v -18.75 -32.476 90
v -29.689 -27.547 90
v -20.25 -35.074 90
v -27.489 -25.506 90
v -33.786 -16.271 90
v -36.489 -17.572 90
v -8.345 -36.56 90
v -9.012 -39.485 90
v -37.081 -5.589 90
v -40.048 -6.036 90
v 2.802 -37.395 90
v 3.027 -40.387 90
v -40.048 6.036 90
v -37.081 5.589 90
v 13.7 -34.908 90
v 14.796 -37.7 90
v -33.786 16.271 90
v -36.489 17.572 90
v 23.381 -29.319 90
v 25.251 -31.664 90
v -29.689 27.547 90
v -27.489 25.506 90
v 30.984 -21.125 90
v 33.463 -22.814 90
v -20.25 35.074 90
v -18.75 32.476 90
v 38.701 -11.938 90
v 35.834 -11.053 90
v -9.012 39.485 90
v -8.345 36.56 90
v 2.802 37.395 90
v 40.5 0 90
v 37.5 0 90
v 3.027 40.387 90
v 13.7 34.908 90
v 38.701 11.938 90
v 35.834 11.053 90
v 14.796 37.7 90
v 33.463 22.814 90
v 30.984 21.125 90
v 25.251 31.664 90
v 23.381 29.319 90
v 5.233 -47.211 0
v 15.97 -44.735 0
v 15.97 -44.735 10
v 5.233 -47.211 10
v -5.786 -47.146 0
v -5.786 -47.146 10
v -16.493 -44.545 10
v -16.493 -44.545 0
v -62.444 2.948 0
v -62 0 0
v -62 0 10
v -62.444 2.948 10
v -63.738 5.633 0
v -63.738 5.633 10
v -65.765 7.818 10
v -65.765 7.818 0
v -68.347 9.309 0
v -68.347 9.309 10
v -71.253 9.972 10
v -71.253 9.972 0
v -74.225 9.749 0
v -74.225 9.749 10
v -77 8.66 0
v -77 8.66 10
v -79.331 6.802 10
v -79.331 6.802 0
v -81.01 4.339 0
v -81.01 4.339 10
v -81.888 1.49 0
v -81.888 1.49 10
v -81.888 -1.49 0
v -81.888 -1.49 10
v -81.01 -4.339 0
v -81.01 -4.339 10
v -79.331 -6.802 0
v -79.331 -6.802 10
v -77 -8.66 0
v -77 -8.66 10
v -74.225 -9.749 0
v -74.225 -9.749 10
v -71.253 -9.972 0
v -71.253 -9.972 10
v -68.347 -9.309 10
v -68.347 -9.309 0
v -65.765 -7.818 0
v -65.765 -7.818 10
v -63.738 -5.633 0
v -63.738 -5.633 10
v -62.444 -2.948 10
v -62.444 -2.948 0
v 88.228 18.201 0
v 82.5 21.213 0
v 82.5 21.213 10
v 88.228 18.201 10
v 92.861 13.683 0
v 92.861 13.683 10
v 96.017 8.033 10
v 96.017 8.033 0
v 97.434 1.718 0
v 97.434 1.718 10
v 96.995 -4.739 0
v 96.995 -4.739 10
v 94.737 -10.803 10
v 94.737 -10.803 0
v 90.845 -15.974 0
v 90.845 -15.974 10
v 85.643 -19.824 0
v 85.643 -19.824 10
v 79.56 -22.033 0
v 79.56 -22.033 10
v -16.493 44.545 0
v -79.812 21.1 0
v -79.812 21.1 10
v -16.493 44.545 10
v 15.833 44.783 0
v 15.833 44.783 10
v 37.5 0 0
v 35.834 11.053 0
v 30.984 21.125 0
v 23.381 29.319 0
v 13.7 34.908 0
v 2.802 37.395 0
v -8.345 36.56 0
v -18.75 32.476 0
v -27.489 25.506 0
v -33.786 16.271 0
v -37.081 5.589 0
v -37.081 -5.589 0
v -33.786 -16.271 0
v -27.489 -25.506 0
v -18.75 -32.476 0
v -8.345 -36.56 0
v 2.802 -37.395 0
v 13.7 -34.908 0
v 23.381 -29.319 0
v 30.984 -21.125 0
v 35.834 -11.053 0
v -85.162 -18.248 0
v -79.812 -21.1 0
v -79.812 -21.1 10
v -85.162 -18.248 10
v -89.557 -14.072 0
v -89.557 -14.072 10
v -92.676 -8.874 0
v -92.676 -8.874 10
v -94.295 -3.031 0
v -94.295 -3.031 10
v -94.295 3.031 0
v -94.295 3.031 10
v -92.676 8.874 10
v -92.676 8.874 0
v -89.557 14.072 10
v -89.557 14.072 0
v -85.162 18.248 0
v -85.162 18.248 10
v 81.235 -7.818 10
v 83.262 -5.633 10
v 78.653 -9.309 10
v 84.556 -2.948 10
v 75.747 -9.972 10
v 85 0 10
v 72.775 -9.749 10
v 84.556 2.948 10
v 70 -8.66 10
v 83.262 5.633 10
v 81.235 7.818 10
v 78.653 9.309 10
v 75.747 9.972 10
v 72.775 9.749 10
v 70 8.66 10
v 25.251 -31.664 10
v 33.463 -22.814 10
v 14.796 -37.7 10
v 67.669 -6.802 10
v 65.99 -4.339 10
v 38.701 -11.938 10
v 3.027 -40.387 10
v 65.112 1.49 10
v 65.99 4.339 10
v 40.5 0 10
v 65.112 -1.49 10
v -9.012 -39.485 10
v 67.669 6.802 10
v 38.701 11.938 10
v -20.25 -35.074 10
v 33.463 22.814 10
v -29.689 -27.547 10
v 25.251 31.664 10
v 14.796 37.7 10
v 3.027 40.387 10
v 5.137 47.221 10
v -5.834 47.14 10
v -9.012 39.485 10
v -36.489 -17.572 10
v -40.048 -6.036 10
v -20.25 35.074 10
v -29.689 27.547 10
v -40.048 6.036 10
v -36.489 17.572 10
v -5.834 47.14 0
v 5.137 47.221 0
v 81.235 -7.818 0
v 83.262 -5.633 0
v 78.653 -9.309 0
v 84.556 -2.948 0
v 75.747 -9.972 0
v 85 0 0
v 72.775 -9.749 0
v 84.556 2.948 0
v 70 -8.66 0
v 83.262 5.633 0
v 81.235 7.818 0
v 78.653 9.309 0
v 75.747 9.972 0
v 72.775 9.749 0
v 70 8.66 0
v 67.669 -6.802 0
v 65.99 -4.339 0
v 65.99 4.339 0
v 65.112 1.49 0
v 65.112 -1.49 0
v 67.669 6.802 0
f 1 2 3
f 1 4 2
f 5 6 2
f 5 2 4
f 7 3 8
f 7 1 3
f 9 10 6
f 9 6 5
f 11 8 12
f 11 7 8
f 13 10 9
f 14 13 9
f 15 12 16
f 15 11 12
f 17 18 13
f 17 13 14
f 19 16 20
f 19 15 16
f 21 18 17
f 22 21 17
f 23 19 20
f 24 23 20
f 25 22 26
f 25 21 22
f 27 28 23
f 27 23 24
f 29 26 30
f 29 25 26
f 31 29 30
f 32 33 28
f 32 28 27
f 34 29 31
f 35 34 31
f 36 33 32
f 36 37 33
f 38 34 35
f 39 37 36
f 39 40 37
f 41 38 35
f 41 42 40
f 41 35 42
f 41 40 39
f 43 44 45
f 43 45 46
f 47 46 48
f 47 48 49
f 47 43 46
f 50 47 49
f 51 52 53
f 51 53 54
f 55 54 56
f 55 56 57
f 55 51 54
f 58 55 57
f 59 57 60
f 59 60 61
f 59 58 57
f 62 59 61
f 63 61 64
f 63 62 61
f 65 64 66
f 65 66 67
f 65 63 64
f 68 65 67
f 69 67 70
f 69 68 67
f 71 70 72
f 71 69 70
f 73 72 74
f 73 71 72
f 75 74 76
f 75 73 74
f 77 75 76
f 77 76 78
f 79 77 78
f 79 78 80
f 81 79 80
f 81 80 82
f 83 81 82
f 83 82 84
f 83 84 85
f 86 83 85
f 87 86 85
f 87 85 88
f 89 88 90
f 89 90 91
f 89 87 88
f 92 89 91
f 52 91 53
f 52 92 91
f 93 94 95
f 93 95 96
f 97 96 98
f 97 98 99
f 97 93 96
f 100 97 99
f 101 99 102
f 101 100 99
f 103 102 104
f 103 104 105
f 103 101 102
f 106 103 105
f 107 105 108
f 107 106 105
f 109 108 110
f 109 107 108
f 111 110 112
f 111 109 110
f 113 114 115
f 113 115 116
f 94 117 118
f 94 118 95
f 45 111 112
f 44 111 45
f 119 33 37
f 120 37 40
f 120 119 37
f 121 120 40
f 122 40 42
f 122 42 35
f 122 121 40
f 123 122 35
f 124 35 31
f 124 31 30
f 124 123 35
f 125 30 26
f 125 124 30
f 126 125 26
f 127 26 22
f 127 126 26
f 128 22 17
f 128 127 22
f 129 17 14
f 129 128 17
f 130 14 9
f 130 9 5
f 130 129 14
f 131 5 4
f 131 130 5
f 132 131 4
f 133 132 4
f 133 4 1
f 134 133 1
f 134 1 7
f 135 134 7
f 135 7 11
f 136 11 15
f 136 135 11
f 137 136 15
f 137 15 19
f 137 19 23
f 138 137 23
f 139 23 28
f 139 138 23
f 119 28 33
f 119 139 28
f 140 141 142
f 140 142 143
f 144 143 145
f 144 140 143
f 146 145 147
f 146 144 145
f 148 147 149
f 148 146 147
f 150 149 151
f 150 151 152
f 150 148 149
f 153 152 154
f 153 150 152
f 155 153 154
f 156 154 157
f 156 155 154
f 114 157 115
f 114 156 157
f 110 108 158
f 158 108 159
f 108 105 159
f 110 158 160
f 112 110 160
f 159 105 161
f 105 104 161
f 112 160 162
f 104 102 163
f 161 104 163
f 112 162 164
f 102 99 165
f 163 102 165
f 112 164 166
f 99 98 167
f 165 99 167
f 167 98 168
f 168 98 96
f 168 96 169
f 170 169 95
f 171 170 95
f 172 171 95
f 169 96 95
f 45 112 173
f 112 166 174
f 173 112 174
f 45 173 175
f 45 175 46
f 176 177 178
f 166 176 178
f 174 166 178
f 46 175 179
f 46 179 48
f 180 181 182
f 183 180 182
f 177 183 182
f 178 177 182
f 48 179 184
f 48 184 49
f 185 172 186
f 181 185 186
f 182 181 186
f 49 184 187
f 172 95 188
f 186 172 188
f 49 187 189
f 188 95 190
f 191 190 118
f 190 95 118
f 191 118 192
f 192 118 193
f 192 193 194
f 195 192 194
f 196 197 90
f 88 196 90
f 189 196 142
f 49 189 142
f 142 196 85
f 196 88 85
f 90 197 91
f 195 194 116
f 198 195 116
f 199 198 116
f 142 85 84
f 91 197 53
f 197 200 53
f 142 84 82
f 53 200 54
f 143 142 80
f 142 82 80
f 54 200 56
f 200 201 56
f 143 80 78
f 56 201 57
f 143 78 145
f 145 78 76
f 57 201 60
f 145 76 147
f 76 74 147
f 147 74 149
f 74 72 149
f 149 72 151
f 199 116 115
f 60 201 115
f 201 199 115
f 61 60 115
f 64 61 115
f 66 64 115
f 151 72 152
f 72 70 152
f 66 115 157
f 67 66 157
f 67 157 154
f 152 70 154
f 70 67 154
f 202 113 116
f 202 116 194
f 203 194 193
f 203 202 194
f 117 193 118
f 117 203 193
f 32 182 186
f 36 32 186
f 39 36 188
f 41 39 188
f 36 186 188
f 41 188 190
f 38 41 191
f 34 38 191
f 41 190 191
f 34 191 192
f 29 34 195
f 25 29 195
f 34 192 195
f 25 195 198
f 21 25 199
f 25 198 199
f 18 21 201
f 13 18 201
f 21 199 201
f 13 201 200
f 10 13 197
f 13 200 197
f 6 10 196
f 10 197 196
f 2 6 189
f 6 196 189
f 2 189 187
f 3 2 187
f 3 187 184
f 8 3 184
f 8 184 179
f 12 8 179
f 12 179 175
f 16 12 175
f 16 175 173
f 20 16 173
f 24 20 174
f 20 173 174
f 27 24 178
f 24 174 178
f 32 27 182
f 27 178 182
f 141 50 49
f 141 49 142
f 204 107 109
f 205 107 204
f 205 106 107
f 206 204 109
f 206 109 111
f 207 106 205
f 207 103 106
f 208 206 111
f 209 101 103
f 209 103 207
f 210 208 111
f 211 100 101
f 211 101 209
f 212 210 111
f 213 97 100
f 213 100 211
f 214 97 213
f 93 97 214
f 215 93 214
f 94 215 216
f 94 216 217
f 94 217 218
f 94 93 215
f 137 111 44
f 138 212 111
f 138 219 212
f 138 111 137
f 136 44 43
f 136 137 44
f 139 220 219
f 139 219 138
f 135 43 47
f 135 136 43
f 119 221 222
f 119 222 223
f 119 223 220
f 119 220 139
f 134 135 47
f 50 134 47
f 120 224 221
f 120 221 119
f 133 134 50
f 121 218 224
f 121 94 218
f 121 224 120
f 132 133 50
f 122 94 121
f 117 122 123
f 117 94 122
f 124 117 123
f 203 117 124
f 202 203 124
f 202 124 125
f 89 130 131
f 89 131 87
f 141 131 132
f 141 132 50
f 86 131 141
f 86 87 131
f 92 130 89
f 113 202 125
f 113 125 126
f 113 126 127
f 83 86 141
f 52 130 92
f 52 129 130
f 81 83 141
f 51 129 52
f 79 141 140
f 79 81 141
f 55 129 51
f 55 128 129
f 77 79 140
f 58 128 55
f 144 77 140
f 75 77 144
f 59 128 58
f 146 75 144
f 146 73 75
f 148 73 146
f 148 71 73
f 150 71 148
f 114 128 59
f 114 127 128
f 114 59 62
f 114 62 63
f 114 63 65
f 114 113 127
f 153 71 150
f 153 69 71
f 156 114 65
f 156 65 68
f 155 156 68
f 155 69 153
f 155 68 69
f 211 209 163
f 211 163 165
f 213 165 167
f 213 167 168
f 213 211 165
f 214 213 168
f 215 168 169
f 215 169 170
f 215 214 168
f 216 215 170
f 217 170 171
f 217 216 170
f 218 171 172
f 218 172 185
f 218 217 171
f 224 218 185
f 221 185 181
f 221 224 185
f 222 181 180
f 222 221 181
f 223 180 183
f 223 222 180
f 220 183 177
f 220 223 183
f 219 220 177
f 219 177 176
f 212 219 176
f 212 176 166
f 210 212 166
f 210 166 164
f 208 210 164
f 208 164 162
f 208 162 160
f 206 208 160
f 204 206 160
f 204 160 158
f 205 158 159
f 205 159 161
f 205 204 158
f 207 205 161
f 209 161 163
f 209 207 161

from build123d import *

# Parameters (mm, degrees)
SKETCH1_R           = 37.5
SKETCH1_R_2         = 10
BOSS_EXTRUDE1_DEPTH = 10
SKETCH2_R           = 40.5
SKETCH2_R_2         = 37.5
BOSS_EXTRUDE2_DEPTH = 80


with BuildPart() as part:
    # Sketch1 → Boss-Extrude1 (new body)
    with BuildSketch(Plane.XY):
        with BuildLine():
            Line((-79.8125, 21.10011478), (-16.493055556, 44.544686759))
            ThreePointArc((-16.493055556, 44.544686759), (-0.350796057, 47.498704636), (15.833333333, 44.783429475))
            Line((15.833333333, 44.783429475), (82.5, 21.213203436))
            ThreePointArc((82.5, 21.213203436), (97.448185953, -1.526088923), (79.56, -22.033075137))
            Line((79.56, -22.033075137), (15.970417375, -44.734726655))
            ThreePointArc((15.970417375, -44.734726655), (-0.27805837, -47.499186136), (-16.493055556, -44.544686759))
            Line((-16.493055556, -44.544686759), (-79.8125, -21.10011478))
            ThreePointArc((-79.8125, -21.10011478), (-94.5, 0), (-79.8125, 21.10011478))
        make_face()
        Circle(SKETCH1_R, mode=Mode.SUBTRACT)
        with Locations((-72, 0)):
            Circle(SKETCH1_R_2, mode=Mode.SUBTRACT)
        with Locations((75, 0)):
            Circle(SKETCH1_R_2, mode=Mode.SUBTRACT)
    extrude(amount=BOSS_EXTRUDE1_DEPTH)

    # Sketch2 → Boss-Extrude2 (add)
    with BuildSketch(Plane.XY.offset(10)):
        Circle(SKETCH2_R)
        Circle(SKETCH2_R_2, mode=Mode.SUBTRACT)
    extrude(amount=BOSS_EXTRUDE2_DEPTH)


solid = part.part
